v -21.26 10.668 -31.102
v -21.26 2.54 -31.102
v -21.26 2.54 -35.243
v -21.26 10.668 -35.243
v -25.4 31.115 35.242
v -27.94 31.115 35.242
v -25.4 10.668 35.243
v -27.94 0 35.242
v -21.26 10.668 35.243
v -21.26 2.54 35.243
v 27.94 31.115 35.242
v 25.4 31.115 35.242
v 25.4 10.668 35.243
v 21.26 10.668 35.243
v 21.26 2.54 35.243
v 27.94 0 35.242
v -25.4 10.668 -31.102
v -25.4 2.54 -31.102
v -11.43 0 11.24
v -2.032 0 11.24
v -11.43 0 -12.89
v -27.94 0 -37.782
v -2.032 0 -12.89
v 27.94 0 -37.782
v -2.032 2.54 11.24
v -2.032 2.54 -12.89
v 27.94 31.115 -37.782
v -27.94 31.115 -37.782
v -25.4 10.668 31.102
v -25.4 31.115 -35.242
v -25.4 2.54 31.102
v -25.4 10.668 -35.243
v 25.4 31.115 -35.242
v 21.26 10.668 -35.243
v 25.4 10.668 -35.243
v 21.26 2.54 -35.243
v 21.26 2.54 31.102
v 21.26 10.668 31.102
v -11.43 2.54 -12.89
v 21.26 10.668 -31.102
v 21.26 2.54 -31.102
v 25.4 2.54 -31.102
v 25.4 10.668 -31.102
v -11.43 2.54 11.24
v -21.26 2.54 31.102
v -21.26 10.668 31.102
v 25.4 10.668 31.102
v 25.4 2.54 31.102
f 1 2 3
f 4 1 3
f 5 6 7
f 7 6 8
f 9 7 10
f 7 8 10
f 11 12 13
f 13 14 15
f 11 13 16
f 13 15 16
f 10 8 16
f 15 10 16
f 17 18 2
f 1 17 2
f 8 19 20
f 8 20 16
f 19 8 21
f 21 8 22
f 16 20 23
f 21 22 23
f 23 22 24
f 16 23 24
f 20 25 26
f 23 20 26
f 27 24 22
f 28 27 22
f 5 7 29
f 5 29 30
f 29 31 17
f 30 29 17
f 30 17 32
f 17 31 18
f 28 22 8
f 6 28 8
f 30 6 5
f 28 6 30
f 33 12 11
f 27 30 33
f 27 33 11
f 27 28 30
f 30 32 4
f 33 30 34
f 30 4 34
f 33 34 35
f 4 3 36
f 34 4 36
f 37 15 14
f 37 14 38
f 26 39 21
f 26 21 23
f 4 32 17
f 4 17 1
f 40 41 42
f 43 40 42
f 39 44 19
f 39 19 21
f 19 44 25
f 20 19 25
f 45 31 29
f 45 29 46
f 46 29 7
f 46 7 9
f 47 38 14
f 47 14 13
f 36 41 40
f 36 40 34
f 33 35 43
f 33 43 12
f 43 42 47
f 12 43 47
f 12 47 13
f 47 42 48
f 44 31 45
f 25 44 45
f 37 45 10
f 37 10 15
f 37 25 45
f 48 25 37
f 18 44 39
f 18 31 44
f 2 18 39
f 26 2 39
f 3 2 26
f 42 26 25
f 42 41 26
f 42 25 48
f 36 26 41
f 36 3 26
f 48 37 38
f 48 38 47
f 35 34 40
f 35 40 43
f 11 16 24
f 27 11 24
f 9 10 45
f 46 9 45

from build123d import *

# Parameters (mm, degrees)
SKETCH1_W           = 50.8
SKETCH1_H           = 70.485
BOSS_EXTRUDE1_DEPTH = 2.54
BOSS_EXTRUDE2_DEPTH = 31.115
SKETCH6_W           = 4.1402
SKETCH6_H           = 4.1402
BOSS_EXTRUDE3_DEPTH = 8.128
SKETCH8_W           = 9.398
SKETCH8_H           = 24.13
CUT_EXTRUDE2_DEPTH  = 3.54


with BuildPart() as part:
    # Sketch1 → Boss-Extrude1 (new body)
    with BuildSketch(Plane(origin=(0, 0, 0), x_dir=(1, 0, 0), z_dir=(0, 1, 0))):
        Rectangle(SKETCH1_W, SKETCH1_H)
    extrude(amount=BOSS_EXTRUDE1_DEPTH)

    # Sketch5 → Boss-Extrude2 (add)
    with BuildSketch(Plane(origin=(0, 0, 0), x_dir=(1, 0, 0), z_dir=(0, 1, 0))):
        Polygon((27.94, -35.2425), (27.94, 37.7825), (-27.94, 37.7825), (-27.94, -35.2425), (-25.4, -35.2425), (-25.4, 35.2425), (25.4, 35.2425), (25.4, -35.2425), align=None)
    extrude(amount=BOSS_EXTRUDE2_DEPTH)

    # Sketch6 → Boss-Extrude3 (add)
    with BuildSketch(Plane(origin=(0, 2.54, 0), x_dir=(1, 0, 0), z_dir=(0, 1, 0))):
        with Locations((-23.3299, 33.1724)):
            Rectangle(SKETCH6_W, SKETCH6_H)
        with Locations((23.3299, 33.1724)):
            Rectangle(SKETCH6_W, SKETCH6_H)
        with Locations((23.3299, -33.1724)):
            Rectangle(SKETCH6_W, SKETCH6_H)
        with Locations((-23.3299, -33.1724)):
            Rectangle(SKETCH6_W, SKETCH6_H)
    extrude(amount=BOSS_EXTRUDE3_DEPTH)

    # Sketch8 → Cut-Extrude2 (cut, through all)
    with BuildSketch(Plane(origin=(0, 2.54, 0), x_dir=(1, 0, 0), z_dir=(0, 1, 0))):
        with Locations((-6.731, 0.8255)):
            Rectangle(SKETCH8_W, SKETCH8_H)
    extrude(amount=-CUT_EXTRUDE2_DEPTH, mode=Mode.SUBTRACT)


solid = part.part
